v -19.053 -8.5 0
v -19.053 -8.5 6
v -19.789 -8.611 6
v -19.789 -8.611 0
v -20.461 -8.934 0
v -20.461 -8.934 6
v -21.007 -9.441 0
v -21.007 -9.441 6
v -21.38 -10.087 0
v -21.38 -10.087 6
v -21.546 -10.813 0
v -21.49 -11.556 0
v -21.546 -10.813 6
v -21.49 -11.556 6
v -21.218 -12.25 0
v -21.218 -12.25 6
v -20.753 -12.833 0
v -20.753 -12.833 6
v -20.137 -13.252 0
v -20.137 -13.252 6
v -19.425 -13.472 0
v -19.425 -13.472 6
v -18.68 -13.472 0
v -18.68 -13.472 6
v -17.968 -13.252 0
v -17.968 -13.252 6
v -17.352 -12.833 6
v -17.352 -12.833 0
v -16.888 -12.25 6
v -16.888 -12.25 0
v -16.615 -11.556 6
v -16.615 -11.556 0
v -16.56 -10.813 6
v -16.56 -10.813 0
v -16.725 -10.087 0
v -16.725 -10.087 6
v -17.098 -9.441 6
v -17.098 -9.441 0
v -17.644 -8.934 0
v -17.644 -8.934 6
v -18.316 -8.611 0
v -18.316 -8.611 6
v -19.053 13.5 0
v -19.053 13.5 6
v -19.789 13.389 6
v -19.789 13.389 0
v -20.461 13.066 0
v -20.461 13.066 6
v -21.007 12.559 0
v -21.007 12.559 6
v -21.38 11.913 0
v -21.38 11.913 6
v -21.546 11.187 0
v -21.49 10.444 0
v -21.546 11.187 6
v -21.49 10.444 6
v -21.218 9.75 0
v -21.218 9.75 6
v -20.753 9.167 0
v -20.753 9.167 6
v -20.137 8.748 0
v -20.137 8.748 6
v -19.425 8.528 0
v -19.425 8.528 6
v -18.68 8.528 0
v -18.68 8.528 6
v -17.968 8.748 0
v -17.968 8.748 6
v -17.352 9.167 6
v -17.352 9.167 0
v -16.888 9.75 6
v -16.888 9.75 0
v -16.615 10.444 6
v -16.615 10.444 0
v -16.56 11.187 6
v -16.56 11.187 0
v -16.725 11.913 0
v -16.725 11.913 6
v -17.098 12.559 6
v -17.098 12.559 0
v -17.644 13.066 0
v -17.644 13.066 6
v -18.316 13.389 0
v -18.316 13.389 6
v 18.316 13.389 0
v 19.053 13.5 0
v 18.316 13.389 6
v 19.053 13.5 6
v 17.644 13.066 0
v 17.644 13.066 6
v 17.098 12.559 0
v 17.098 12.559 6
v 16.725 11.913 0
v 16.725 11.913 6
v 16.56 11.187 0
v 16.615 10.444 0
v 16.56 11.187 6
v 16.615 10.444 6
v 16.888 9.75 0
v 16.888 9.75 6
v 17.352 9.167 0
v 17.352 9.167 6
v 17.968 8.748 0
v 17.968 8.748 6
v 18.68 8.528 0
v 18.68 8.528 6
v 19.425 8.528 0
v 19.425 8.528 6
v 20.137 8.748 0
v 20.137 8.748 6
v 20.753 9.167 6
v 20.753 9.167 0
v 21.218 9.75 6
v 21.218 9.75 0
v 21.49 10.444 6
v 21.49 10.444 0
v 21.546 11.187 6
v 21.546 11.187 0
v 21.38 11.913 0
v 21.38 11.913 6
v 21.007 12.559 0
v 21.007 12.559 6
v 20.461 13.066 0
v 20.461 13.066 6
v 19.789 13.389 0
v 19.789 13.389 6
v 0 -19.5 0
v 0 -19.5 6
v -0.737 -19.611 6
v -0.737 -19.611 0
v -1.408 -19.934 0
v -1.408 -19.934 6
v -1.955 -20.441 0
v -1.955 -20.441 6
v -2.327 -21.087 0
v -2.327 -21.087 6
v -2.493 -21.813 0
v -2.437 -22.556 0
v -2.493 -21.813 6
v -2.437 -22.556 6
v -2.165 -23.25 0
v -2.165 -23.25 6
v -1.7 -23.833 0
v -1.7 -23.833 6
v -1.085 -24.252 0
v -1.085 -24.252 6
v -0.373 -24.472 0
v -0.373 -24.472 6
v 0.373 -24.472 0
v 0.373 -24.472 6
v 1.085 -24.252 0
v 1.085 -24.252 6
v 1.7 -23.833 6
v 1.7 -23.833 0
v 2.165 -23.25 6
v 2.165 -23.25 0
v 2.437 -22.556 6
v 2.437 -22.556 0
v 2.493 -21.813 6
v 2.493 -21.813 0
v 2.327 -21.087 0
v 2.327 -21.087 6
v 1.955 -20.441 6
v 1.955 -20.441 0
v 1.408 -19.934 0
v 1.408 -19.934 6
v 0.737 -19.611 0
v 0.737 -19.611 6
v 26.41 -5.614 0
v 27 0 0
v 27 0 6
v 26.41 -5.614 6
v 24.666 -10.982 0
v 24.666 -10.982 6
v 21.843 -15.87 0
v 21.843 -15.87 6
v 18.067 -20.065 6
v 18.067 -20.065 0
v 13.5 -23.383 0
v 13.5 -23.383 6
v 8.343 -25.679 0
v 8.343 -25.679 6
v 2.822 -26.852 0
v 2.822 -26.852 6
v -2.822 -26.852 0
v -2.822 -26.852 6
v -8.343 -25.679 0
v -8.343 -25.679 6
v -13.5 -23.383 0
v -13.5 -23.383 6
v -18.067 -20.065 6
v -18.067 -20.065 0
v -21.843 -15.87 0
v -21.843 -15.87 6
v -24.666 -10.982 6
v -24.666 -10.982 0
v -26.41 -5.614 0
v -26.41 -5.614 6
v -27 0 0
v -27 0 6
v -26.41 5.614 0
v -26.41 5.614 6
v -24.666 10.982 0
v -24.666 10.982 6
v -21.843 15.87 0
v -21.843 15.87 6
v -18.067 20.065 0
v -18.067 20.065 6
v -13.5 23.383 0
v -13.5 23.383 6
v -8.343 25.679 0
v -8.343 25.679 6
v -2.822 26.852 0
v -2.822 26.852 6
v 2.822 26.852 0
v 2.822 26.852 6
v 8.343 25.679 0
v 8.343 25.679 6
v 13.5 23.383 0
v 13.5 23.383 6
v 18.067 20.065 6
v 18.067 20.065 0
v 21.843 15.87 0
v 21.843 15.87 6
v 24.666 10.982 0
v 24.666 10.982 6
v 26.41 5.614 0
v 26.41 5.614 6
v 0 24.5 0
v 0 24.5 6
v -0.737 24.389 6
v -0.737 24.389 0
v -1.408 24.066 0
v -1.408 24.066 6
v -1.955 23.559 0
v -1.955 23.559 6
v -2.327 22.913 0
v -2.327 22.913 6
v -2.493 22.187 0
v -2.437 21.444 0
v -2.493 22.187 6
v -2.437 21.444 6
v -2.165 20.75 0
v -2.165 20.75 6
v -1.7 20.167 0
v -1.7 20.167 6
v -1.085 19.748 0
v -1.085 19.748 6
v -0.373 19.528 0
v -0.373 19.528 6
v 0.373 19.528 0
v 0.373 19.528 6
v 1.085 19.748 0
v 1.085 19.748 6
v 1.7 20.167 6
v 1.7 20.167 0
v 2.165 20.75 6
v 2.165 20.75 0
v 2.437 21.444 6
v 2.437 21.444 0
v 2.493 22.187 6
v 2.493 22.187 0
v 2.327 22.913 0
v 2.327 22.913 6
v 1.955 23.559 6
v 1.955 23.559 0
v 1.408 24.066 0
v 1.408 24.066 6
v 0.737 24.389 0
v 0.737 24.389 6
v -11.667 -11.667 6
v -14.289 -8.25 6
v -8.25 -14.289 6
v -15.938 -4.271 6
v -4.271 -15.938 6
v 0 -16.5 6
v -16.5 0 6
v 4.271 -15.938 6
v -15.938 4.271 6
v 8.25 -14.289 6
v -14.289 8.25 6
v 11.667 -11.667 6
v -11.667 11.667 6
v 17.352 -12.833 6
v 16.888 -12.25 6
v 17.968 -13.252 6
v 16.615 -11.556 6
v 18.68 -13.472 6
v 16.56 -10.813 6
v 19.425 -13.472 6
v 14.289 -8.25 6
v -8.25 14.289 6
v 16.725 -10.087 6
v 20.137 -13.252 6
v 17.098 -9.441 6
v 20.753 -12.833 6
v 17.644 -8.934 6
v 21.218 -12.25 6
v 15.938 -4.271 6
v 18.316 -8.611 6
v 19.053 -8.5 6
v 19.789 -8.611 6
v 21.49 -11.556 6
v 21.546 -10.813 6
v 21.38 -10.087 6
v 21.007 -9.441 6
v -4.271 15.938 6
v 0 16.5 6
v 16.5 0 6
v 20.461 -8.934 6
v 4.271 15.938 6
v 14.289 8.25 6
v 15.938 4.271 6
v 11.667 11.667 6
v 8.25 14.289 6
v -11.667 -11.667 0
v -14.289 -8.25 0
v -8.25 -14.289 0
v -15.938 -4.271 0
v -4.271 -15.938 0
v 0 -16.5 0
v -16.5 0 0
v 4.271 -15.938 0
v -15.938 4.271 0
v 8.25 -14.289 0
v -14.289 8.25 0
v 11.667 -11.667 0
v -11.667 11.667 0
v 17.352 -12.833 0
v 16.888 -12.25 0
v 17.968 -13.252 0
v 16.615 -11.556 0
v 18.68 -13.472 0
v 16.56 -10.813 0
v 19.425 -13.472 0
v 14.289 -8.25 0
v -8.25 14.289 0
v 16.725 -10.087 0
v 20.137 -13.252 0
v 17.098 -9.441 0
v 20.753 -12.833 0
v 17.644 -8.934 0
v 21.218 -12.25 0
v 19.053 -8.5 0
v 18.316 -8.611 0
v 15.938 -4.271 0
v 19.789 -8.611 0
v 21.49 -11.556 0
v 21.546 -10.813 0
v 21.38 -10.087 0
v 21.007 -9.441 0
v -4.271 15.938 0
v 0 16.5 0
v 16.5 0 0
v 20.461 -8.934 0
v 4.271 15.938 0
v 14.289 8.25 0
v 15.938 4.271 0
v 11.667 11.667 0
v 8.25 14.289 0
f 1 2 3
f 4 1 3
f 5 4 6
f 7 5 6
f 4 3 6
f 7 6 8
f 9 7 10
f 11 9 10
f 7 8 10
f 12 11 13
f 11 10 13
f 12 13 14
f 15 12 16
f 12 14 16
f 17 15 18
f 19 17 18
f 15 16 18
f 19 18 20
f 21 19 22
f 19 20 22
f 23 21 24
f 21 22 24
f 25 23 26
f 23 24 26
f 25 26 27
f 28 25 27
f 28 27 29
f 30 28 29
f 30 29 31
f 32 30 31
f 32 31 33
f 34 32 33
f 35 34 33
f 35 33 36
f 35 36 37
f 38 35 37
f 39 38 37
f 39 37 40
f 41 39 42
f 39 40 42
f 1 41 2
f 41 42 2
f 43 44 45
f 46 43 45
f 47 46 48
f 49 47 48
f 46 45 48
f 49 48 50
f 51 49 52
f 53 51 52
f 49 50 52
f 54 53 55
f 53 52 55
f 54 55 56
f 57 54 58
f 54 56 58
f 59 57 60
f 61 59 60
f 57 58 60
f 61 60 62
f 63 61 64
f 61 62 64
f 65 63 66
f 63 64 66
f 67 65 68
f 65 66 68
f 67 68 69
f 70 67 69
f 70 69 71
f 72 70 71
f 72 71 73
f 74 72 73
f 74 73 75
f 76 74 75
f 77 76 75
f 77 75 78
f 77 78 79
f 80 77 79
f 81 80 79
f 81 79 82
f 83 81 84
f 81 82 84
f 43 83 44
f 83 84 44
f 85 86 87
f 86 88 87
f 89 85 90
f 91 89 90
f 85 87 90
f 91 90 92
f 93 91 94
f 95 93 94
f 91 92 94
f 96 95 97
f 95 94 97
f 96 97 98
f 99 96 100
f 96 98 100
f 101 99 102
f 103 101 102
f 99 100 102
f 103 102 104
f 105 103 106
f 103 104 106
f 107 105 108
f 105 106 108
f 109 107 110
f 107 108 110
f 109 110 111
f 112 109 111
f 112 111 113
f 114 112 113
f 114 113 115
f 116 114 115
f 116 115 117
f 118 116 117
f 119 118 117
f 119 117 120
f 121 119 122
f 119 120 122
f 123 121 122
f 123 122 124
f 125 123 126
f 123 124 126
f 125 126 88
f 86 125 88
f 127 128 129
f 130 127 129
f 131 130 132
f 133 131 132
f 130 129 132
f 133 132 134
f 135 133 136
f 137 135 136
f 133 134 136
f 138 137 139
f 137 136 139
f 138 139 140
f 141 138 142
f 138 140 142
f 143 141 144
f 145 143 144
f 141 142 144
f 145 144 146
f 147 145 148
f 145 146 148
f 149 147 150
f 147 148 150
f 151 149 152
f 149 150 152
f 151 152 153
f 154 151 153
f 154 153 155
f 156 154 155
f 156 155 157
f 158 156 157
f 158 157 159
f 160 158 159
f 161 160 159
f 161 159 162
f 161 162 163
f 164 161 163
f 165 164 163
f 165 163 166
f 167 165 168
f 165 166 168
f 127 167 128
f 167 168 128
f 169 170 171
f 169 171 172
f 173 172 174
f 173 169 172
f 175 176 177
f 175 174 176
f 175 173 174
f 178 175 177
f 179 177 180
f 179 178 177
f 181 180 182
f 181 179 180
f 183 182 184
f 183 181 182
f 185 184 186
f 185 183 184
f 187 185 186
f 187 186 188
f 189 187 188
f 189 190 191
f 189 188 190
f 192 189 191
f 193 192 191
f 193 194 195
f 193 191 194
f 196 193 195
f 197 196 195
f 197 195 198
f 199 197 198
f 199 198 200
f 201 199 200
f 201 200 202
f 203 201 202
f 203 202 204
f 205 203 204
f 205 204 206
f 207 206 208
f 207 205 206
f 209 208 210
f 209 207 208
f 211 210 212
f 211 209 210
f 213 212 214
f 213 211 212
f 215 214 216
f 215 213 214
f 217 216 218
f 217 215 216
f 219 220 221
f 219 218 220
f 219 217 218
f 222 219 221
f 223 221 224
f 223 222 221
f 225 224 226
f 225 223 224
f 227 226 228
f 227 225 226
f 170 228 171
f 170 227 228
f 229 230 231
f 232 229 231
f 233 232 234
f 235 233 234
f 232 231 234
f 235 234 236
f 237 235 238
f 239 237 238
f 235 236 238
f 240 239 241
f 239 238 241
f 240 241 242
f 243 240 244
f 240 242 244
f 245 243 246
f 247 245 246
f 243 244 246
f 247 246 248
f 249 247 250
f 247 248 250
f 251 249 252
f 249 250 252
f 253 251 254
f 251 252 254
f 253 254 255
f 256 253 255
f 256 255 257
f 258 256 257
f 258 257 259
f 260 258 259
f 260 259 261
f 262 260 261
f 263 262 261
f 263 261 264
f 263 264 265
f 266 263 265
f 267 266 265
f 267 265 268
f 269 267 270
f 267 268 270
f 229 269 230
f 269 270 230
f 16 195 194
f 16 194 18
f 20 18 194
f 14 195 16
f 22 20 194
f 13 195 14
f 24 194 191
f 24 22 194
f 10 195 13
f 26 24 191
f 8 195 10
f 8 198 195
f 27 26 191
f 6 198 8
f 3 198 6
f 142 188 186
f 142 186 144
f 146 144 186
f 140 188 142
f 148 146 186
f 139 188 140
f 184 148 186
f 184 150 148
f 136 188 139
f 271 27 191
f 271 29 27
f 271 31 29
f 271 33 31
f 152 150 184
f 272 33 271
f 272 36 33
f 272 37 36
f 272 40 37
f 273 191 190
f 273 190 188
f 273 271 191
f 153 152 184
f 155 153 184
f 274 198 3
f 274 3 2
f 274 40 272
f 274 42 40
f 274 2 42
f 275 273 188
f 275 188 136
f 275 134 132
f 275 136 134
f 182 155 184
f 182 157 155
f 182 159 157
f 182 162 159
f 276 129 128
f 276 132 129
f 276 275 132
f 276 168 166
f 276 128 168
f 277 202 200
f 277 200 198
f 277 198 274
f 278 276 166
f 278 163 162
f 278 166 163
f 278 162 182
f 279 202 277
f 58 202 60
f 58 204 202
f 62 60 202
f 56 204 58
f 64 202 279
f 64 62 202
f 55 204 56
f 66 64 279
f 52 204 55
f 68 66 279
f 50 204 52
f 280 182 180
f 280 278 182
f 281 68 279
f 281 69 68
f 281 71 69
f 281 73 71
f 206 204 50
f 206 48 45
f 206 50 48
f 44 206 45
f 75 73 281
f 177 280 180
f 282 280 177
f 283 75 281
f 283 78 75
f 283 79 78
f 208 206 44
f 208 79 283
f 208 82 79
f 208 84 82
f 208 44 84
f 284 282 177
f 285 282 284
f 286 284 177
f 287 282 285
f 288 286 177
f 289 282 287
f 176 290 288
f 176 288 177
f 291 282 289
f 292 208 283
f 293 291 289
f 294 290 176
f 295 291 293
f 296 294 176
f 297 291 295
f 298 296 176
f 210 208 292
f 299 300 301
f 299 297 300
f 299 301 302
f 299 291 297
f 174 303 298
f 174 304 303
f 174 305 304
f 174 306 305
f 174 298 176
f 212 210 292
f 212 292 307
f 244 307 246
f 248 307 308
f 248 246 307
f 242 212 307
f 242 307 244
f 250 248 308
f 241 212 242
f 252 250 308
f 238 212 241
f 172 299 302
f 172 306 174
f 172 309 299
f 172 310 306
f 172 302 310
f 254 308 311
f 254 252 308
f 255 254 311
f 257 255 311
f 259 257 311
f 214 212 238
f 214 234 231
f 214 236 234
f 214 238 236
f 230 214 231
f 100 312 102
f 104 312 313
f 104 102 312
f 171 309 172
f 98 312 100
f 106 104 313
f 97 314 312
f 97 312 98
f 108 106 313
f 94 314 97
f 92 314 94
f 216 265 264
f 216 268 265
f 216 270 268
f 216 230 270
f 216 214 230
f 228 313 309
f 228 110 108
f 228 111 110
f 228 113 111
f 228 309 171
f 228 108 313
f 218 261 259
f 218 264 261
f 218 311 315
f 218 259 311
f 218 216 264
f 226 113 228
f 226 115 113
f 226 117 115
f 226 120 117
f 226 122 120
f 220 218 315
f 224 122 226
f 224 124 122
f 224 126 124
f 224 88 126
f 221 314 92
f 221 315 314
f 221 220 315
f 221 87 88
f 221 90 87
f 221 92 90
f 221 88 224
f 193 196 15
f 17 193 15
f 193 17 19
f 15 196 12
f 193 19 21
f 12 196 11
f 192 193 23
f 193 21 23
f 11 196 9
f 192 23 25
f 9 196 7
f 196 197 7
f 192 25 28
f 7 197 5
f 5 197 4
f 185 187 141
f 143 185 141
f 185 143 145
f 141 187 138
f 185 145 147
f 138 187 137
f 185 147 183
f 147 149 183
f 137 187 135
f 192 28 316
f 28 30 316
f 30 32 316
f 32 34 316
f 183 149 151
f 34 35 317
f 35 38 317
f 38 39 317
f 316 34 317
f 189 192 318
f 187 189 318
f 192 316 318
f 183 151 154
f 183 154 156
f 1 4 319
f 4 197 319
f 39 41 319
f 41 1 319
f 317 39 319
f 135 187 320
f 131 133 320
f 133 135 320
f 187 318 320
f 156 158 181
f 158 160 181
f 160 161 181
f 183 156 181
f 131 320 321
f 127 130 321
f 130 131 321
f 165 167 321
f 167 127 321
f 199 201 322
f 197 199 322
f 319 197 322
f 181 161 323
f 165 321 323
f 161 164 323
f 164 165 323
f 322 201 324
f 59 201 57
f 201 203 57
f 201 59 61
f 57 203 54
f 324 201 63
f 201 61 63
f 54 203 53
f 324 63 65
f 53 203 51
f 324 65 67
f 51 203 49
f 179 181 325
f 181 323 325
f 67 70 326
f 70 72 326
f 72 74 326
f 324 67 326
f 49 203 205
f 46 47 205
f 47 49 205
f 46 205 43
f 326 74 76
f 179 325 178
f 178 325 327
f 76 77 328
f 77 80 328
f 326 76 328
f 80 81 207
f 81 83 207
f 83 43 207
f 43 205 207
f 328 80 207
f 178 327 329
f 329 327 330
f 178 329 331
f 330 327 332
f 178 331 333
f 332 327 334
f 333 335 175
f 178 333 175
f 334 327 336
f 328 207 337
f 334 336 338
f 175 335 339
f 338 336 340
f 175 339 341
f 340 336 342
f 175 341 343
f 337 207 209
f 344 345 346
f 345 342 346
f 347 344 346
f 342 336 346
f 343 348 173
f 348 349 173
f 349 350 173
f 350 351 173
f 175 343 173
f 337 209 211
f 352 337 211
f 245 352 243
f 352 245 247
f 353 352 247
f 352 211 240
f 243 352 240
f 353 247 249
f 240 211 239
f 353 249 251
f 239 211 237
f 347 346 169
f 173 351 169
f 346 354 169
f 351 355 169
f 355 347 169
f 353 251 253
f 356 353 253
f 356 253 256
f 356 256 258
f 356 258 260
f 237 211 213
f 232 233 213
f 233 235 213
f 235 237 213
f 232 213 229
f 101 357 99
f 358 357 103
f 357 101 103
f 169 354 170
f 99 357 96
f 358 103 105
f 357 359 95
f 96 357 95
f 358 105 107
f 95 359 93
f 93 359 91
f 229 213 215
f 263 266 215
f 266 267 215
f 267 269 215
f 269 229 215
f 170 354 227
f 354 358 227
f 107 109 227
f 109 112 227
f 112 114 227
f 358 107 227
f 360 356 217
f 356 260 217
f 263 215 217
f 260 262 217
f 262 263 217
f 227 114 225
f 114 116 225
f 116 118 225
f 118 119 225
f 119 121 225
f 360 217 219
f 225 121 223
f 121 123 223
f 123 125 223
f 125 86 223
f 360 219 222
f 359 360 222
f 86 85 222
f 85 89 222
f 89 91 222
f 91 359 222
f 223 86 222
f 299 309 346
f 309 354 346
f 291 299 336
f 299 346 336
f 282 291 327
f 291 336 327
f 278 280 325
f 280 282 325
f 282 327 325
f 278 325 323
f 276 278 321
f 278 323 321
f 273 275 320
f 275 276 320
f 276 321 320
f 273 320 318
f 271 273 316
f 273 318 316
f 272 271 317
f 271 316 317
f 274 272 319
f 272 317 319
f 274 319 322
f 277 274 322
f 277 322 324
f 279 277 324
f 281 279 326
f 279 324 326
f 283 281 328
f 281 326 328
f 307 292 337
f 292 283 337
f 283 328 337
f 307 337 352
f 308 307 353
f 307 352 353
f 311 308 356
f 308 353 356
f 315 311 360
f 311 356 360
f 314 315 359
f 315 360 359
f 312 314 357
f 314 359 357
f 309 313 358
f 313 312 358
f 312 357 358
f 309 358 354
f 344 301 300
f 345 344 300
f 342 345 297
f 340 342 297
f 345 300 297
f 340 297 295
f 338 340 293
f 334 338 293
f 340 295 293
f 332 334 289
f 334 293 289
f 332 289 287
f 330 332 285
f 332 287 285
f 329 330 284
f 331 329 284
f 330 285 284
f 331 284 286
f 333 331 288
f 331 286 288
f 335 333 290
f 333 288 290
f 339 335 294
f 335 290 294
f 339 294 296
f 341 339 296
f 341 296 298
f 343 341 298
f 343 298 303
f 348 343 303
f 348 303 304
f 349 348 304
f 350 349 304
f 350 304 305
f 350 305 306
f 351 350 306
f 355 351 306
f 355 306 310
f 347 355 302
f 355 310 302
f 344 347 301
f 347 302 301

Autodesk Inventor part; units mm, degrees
ref_plane "YZ Plane" through (0, 0, 0) normal (1, 0, 0) x (0, 1, 0)
ref_plane "XZ Plane" through (0, 0, 0) normal (0, 1, 0) x (-1, 0, 0)
ref_plane "XY Plane" through (0, 0, 0) normal (0, 0, 1) x (1, 0, 0)
sketch "Sketch1" plane through (0, 0, 0) normal (0, 0, 1) x (1, 0, 0)
  circle A0 centre (0, 0) radius 16.5
  circle A1 centre (0, 0) radius 27
  point P0 (0, 22)
  point P1 (-19.0526, 11)
  point P2 (-19.0526, -11)
  point P3 (0, -22)
  point P4 (19.0526, -11)
  point P5 (19.0526, 11)
  dimension "d9" = 33
  dimension "d20" = 22
  dimension "d23" = 360
  dimension "d58" = 54
extrude "Extrusion2" add sketch "Sketch1" along normal blind 6
hole "Hole3" at (0, 22, 0) at (-19.0526, 11, 0) at (-19.0526, -11, 0) at (0, -22, 0) at (19.0526, 11, 0) at (19.0526, -11, 0) direction (0, 0, 1) diameter 5 end through all
properties part number "SpacerSprocketHubPlate"
